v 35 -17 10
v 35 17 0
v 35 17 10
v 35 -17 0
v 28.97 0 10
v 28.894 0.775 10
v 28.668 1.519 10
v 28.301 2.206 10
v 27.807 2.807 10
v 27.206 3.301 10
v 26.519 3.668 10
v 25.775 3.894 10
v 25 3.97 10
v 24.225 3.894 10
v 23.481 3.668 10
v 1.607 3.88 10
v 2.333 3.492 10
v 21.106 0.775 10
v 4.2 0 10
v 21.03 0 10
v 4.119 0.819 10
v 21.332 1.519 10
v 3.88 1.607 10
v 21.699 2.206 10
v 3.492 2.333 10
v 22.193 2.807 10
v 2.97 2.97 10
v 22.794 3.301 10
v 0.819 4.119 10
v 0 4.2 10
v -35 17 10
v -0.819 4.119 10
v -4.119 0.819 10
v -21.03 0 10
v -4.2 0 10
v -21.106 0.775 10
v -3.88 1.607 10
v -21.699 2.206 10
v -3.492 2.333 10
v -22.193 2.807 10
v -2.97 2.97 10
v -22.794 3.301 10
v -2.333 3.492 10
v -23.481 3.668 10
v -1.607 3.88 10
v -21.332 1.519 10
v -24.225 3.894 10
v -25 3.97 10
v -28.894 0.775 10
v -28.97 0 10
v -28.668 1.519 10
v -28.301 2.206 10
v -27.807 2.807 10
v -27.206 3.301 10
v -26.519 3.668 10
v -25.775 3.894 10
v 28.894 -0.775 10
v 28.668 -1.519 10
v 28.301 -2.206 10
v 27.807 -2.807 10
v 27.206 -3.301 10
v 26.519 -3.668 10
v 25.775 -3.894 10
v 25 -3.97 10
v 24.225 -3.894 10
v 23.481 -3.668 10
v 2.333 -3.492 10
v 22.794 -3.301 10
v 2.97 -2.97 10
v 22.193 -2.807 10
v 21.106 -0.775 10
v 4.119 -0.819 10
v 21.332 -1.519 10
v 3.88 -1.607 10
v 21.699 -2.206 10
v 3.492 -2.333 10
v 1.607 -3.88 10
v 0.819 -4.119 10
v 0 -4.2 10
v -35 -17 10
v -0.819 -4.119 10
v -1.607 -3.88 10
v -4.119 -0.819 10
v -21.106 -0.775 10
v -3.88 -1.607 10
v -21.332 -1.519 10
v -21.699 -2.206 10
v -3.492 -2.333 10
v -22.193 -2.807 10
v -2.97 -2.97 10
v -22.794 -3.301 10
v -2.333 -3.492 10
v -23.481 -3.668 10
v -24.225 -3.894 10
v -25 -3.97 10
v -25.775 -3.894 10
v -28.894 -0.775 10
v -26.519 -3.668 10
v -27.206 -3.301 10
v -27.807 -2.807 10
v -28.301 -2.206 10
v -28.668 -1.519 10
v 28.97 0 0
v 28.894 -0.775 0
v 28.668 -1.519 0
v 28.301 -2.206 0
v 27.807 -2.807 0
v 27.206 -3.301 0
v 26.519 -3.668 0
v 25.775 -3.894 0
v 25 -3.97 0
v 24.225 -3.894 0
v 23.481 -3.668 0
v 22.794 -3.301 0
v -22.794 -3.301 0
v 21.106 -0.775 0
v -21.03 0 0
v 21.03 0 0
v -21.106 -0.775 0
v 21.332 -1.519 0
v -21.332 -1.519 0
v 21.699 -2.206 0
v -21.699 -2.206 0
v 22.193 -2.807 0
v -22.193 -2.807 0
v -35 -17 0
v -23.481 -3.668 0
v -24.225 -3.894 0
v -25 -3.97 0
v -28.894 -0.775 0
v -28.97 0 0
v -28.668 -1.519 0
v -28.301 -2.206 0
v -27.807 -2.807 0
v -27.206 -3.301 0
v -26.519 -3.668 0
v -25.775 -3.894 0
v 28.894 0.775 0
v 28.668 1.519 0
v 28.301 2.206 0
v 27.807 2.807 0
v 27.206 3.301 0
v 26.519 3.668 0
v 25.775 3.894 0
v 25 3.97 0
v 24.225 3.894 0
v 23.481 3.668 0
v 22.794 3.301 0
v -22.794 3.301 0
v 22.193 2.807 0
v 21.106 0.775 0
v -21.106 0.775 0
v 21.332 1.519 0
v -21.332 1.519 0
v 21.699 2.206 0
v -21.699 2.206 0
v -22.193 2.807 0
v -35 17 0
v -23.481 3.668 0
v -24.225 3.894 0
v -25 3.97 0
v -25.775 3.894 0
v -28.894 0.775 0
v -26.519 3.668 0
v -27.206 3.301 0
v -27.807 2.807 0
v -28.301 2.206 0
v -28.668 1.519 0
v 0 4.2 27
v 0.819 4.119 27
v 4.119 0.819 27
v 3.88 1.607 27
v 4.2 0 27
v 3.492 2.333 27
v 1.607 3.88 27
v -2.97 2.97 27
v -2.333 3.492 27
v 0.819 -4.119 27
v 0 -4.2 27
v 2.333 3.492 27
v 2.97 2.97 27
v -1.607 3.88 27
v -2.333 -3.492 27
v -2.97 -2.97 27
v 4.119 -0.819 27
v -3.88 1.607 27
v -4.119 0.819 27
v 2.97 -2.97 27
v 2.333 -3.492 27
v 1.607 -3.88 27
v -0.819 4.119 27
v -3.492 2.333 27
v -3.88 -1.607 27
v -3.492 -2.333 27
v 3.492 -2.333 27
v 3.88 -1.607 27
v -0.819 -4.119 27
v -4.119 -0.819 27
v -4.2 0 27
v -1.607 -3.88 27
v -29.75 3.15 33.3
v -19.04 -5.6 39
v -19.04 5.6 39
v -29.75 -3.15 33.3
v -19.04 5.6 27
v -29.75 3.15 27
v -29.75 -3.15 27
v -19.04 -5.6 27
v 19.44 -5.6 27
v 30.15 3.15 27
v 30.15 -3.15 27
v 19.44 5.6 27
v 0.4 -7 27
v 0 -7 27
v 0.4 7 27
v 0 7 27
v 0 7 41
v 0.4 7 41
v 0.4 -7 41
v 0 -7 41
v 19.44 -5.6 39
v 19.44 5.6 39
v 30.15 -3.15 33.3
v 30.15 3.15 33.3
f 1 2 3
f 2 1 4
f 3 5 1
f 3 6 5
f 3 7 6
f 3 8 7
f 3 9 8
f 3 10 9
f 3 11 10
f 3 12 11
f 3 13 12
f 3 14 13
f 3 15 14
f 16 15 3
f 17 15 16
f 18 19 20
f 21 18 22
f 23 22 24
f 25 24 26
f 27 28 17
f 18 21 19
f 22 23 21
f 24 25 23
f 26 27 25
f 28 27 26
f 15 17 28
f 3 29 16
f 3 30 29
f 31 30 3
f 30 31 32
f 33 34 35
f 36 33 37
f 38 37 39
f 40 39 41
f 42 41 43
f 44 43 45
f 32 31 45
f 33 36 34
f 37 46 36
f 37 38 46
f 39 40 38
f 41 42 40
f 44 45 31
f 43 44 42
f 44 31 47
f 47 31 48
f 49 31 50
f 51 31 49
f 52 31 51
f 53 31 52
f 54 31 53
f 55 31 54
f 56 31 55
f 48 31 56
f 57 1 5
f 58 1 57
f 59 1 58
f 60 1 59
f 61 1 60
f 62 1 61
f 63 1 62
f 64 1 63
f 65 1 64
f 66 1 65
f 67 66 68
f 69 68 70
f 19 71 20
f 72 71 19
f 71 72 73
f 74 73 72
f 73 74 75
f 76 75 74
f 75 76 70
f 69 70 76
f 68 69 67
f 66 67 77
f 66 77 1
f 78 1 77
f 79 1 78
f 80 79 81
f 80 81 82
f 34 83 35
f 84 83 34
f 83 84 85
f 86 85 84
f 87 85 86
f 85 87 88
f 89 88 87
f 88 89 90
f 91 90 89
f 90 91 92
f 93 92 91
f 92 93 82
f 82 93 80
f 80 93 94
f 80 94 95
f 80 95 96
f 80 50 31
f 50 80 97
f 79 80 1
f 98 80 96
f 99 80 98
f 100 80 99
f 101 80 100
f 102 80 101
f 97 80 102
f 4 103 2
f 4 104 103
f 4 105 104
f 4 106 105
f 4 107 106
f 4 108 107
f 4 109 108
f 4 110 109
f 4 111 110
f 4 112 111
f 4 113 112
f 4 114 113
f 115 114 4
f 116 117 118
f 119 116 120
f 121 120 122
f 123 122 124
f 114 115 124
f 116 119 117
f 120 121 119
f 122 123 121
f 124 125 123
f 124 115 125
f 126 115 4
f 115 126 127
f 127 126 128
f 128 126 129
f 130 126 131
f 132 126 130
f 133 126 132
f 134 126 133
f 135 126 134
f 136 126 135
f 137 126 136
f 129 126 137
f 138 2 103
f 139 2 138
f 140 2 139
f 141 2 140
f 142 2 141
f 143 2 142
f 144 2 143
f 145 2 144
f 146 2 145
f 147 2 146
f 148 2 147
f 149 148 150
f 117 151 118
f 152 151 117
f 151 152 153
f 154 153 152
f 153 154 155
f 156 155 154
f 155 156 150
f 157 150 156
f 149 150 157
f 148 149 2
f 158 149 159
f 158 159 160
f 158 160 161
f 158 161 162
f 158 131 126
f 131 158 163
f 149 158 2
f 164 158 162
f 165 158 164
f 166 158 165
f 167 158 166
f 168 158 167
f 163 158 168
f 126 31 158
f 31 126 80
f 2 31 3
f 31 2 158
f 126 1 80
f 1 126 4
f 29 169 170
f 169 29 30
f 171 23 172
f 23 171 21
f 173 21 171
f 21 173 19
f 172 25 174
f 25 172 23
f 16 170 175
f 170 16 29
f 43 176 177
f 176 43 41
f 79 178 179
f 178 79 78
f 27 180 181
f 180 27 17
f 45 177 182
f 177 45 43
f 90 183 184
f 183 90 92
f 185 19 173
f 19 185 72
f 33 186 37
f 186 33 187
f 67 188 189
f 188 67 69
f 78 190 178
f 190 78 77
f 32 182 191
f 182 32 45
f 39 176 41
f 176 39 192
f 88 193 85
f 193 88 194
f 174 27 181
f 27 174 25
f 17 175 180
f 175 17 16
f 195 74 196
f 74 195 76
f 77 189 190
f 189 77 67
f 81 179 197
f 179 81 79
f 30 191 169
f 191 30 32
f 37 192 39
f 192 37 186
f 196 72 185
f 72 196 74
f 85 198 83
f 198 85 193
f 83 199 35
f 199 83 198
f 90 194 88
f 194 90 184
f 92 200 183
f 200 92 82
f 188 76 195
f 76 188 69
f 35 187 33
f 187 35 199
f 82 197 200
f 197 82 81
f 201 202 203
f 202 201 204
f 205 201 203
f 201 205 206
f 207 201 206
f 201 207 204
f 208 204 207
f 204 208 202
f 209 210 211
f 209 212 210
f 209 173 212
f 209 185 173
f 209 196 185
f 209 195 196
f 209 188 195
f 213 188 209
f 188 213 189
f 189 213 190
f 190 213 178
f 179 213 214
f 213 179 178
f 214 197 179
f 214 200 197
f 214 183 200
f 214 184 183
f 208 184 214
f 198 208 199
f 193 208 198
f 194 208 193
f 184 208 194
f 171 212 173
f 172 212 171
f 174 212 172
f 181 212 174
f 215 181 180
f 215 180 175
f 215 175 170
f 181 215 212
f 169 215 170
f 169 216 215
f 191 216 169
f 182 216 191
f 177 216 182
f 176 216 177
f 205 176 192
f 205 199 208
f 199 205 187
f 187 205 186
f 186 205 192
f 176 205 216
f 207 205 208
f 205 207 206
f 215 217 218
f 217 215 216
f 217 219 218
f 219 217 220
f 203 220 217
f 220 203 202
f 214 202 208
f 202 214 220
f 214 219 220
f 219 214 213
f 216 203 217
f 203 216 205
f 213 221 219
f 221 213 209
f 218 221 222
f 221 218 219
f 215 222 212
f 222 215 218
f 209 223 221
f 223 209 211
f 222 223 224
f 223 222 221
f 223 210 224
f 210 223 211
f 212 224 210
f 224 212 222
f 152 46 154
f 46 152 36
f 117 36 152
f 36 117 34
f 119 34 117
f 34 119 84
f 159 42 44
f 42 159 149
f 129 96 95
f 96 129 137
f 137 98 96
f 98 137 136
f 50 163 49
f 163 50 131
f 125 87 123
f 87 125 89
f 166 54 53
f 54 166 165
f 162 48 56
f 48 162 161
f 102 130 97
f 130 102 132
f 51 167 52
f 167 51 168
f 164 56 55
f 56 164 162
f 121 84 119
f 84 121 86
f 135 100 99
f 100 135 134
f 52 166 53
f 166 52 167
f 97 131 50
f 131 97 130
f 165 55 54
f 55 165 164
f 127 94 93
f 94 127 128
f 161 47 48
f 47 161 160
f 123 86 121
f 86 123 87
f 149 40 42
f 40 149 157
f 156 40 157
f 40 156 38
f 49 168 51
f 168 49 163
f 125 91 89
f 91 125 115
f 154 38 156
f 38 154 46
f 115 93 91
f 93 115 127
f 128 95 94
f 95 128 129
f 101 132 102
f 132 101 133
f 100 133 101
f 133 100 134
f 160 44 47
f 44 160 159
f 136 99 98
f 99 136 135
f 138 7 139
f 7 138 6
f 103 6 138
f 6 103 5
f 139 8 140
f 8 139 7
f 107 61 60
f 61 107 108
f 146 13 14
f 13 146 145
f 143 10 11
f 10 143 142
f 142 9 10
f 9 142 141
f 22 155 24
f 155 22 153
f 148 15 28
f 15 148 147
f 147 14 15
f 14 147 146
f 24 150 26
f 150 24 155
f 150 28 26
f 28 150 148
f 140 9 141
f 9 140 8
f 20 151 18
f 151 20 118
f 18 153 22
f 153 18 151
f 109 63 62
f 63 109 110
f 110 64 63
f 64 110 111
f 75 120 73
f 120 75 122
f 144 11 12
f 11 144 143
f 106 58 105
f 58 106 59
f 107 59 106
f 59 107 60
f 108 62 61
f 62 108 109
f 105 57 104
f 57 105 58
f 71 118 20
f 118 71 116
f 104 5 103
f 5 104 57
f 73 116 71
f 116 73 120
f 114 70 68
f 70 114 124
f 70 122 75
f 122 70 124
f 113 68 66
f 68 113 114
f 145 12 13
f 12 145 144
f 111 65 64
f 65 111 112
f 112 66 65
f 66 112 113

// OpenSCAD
$fn = 32;

// ----------------------------------------------------------------------
// Boat cleat: 70 mm base, horn 34 mm up
// ----------------------------------------------------------------------

// --- parameters (mm) ---
base_l = 70;              // base length
base_w = 34;              // base width
base_t = 10;              // base thickness
horn_len = 59.5;          // horn length
horn_d = 14;              // horn diameter at the middle
horn_z = 34;              // horn axis height
end_drop = 8;             // how far the horn tips drop
post_d = 8.4;             // centre post diameter
holes_d = 7.94;           // fixing holes
hole_x = 25;              // fixing hole spacing

difference() {
  union() {
    translate([-35, -17, 0]) cube([base_l, base_w, base_t]);
    /* centre post, sunk 1 mm into the base */
    translate([0, 0, 9]) cylinder(h = 25, d = post_d);
    /* horn: a hull chain of boxes, full in the middle and lighter at the tips */
    hull() {
      translate([-29.75, -3.15, 27]) cube([0.4, 6.3, 6.3], center = false);
      translate([-19.04, -5.6, 27]) cube([0.4, 11.2, 12], center = false);
    }
    hull() {
      translate([-19.04, -5.6, 27]) cube([0.4, 11.2, 12], center = false);
      translate([0, -7, 27]) cube([0.4, 14, 14], center = false);
    }
    hull() {
      translate([0, -7, 27]) cube([0.4, 14, 14], center = false);
      translate([19.04, -5.6, 27]) cube([0.4, 11.2, 12], center = false);
    }
    hull() {
      translate([19.04, -5.6, 27]) cube([0.4, 11.2, 12], center = false);
      translate([29.75, -3.15, 27]) cube([0.4, 6.3, 6.3], center = false);
    }
  }
  translate([-25, 0, -2.5]) cylinder(h = base_t + 5, d = holes_d);
  translate([25, 0, -2.5]) cylinder(h = base_t + 5, d = holes_d);
}
